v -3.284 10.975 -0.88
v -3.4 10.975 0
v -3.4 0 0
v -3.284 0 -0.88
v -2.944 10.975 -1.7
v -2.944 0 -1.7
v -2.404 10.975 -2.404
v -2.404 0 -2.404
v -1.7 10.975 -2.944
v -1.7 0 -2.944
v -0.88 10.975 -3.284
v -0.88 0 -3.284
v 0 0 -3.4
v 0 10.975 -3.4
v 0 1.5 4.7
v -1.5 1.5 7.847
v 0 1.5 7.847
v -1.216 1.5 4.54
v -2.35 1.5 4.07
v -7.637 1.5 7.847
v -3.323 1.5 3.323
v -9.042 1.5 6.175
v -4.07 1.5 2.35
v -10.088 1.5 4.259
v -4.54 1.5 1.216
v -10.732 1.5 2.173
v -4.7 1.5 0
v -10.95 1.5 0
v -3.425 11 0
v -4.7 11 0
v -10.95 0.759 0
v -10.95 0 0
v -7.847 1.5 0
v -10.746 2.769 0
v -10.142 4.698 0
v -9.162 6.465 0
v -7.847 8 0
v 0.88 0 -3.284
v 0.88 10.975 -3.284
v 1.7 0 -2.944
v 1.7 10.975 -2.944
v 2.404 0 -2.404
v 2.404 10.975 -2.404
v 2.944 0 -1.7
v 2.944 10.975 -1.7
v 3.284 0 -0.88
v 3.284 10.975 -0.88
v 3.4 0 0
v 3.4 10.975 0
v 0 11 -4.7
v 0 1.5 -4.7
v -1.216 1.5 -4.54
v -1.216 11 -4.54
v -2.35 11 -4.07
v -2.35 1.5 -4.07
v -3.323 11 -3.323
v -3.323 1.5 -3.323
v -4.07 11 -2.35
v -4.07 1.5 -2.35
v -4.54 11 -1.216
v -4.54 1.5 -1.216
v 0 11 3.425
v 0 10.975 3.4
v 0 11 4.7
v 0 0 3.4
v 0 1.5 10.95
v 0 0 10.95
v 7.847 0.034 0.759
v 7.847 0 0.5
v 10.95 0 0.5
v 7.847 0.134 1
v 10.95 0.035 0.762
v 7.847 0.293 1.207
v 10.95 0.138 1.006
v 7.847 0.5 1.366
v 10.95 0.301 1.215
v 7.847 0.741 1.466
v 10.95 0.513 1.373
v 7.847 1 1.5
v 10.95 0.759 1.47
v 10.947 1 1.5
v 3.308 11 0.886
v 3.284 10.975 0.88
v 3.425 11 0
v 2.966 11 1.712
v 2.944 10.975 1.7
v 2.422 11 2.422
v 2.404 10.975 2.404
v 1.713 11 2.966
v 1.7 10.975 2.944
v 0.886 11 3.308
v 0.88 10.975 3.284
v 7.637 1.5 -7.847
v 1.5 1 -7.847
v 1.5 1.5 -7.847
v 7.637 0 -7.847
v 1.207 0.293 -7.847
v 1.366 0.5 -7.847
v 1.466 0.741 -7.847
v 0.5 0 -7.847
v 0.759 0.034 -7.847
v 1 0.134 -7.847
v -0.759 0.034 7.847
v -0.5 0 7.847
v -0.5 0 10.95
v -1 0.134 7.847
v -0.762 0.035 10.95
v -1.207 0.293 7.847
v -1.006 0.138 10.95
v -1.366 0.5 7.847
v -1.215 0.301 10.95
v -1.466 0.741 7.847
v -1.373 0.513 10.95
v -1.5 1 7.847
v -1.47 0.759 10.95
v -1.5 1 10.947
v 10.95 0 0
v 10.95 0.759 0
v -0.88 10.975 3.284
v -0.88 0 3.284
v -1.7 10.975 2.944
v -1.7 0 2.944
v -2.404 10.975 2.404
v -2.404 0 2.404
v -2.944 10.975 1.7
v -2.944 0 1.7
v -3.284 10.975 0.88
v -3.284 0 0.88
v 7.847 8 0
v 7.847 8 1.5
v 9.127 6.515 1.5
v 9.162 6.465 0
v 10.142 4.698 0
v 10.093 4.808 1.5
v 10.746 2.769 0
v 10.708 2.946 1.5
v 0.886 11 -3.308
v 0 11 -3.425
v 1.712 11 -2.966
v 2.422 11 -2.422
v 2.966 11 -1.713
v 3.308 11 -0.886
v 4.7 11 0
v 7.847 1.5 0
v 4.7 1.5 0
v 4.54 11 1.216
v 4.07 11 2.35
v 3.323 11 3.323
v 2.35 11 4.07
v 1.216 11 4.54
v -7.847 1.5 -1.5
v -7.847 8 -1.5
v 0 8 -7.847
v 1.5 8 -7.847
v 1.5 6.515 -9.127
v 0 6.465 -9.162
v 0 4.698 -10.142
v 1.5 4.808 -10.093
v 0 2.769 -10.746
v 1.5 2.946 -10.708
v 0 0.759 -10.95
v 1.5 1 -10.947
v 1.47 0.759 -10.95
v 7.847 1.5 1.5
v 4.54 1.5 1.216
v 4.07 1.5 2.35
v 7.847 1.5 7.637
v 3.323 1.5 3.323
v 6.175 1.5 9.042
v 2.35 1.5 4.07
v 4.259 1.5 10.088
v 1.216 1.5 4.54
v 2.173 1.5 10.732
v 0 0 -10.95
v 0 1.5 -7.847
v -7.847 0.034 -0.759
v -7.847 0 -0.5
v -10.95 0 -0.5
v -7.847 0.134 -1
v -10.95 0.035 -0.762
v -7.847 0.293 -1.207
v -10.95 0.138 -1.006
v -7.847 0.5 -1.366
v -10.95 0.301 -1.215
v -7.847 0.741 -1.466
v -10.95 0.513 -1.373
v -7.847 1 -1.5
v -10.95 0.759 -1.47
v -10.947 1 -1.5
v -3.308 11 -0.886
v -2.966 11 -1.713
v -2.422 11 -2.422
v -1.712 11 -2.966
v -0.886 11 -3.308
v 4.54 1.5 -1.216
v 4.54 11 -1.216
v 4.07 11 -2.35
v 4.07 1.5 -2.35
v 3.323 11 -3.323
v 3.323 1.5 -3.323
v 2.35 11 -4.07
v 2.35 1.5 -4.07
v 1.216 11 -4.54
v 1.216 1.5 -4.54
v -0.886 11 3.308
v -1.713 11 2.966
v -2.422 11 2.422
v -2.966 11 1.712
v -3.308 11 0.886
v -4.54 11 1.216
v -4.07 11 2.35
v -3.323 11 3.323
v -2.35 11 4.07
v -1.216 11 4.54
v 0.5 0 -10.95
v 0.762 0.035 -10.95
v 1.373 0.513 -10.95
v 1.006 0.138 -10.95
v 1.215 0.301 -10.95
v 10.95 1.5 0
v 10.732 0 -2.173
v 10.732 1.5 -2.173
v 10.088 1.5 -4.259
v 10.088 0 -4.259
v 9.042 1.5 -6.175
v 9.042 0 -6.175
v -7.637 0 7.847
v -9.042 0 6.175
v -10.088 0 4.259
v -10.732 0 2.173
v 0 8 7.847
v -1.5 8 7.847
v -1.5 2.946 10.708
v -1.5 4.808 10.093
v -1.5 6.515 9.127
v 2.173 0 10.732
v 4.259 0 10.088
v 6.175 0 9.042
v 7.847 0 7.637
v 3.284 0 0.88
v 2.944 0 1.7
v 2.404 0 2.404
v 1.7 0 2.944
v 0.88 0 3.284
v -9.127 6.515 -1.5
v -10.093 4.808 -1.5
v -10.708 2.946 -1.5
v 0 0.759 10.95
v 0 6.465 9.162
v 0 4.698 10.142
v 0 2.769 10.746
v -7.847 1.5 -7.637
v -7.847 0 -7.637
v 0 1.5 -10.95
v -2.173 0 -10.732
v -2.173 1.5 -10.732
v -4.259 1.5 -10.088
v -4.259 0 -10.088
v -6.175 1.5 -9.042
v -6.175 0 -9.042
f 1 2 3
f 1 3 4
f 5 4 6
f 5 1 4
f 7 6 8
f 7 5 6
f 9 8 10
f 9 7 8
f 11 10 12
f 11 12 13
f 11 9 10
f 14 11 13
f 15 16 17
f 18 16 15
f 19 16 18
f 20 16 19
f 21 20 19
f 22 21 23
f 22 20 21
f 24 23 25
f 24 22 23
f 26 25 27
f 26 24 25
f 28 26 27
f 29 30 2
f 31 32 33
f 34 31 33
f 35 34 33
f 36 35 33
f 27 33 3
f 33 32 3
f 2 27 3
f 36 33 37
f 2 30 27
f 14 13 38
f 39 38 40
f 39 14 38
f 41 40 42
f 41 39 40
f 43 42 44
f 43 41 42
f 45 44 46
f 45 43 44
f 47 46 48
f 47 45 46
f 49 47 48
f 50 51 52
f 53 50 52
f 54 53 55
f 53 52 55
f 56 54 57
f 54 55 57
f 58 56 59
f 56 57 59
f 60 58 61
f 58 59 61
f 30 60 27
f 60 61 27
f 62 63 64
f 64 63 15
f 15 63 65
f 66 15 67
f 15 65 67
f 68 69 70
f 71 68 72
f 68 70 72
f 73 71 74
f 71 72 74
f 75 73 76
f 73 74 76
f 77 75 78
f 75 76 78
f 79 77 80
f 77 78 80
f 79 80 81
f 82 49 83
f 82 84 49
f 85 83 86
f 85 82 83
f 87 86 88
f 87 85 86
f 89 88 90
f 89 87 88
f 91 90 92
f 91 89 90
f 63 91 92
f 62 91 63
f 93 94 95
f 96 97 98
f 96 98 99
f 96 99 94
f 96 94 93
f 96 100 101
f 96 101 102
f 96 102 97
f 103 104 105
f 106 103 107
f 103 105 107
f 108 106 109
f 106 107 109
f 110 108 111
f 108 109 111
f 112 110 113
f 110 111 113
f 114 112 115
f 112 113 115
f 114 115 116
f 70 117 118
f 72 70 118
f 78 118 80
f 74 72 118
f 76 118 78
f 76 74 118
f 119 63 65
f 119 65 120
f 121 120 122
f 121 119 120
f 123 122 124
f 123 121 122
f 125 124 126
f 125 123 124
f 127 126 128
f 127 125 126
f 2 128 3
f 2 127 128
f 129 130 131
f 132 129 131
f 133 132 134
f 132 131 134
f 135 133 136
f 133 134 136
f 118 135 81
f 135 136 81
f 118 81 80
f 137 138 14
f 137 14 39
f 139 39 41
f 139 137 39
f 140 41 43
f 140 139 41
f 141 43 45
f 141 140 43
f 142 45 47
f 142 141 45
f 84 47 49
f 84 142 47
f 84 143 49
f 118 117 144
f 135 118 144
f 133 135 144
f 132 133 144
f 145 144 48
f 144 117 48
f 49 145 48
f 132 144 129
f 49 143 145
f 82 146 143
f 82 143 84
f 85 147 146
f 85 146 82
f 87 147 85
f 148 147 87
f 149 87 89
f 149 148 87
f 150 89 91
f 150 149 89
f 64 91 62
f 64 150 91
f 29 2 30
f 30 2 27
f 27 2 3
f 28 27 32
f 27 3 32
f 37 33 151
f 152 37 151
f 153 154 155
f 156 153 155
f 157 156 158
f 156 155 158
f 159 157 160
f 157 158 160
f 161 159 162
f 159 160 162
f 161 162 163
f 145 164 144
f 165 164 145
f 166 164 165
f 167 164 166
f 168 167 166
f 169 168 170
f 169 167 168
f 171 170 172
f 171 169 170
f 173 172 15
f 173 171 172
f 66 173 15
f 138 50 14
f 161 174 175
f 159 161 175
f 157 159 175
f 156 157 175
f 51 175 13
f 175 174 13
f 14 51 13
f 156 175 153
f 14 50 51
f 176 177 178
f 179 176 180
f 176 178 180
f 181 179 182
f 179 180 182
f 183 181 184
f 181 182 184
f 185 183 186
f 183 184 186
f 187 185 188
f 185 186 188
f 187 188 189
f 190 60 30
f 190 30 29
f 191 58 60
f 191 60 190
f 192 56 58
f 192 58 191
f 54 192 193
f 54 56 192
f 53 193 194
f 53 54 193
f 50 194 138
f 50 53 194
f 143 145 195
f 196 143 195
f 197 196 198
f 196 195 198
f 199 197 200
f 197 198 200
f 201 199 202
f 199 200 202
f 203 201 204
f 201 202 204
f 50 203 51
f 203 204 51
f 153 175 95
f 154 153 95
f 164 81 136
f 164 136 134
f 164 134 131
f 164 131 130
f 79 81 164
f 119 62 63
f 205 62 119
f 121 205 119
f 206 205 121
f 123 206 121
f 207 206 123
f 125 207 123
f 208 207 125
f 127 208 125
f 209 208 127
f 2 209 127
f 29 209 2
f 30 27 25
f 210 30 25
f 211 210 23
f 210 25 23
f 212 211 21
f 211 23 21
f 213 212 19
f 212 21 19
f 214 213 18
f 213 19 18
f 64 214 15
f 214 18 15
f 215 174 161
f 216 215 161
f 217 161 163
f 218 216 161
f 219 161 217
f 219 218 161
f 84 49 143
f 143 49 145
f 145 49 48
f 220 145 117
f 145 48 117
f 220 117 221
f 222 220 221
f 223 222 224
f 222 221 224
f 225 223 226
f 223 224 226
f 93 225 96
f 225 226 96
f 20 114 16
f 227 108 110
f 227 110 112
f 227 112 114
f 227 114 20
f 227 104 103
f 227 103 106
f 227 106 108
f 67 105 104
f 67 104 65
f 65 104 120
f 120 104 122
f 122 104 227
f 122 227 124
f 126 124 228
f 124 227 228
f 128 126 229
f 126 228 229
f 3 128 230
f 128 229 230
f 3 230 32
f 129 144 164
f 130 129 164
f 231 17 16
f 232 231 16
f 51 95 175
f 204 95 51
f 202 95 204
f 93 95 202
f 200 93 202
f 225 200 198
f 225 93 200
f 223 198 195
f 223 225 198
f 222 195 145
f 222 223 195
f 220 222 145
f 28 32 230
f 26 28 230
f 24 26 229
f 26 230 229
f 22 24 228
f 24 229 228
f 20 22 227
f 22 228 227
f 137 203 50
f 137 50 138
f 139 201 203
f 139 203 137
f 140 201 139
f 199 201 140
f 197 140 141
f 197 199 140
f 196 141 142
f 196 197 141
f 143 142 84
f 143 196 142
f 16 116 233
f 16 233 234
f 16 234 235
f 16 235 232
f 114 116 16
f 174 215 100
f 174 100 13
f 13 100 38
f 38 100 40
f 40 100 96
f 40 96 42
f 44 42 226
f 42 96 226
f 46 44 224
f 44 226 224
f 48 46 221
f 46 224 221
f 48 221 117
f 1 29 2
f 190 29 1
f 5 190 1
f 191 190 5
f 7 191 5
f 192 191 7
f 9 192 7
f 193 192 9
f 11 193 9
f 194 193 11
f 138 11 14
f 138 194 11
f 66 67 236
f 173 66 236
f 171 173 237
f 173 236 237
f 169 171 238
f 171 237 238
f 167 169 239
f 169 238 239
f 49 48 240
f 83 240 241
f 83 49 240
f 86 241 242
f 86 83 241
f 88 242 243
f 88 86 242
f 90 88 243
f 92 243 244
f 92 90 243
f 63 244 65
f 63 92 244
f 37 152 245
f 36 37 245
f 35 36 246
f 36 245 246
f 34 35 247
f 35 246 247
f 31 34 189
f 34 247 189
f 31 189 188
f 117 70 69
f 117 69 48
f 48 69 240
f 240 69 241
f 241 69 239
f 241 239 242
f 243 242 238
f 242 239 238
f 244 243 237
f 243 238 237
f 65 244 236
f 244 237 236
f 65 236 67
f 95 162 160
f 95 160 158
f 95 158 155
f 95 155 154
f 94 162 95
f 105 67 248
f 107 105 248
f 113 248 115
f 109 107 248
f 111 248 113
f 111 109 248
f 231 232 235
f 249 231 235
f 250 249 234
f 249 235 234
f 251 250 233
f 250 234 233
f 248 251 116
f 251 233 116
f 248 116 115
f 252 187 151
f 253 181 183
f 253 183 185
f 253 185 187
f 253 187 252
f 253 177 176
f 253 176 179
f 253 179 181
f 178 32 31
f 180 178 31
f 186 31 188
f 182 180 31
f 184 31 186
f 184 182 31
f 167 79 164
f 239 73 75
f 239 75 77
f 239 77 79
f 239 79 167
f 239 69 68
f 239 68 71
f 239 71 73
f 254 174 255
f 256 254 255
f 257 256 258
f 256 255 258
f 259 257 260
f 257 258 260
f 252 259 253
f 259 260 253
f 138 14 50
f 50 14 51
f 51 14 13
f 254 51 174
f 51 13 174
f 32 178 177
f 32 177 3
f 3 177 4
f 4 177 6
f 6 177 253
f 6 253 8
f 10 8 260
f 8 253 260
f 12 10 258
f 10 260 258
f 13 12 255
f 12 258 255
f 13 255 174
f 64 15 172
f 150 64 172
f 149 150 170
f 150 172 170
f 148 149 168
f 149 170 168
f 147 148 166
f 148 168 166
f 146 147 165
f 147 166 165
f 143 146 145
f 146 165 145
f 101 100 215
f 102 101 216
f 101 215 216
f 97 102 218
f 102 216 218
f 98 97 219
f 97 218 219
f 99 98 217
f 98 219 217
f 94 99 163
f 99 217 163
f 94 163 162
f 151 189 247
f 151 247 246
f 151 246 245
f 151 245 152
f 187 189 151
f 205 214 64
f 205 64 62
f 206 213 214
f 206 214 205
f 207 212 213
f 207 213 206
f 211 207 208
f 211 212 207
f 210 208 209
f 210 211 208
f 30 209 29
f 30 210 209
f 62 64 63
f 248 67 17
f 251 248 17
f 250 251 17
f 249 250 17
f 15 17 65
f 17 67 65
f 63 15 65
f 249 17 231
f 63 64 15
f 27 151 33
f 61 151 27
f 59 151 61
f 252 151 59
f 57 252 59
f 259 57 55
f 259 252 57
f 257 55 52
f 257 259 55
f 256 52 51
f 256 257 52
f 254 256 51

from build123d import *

# Parameters (mm, degrees)
BOSS_EXTRUDE1_DEPTH = 1.5
SKETCH2_W           = 3
SKETCH2_H           = 8
CUT_EXTRUDE1_DEPTH  = 1.5
SKETCH3_W           = 3.103226286
SKETCH3_H           = 1.5
BOSS_EXTRUDE2_DEPTH = 8
FILLET1_R           = 10
FILLET2_R           = 1
BOSS_EXTRUDE3_DEPTH = 11
CIRPATTERN1_COUNT   = 4


with BuildPart() as part:
    # Sketch1 → Boss-Extrude1 (new body)
    with BuildSketch(Plane(origin=(0, 0, 0), x_dir=(1, 0, 0), z_dir=(0, 1, 0))):
        with BuildLine():
            Line((-10.95, 0), (0, 0))
            Line((0, 0), (0, 10.95))
            ThreePointArc((0, 10.95), (-7.742819254, 7.742819254), (-10.95, 0))
        make_face()
    extrude(amount=BOSS_EXTRUDE1_DEPTH)

    # Sketch2 → Cut-Extrude1 (cut)
    with BuildSketch(Plane(origin=(0, 0, 0), x_dir=(1, 0, 0), z_dir=(0, 1, 0))):
        with Locations((-9.346773714, 5.5)):
            Rectangle(SKETCH2_W, SKETCH2_H)
    extrude(amount=CUT_EXTRUDE1_DEPTH, mode=Mode.SUBTRACT)

    # Sketch3 → Boss-Extrude2 (add)
    with BuildSketch(Plane(origin=(0, 0, 0), x_dir=(1, 0, 0), z_dir=(0, 1, 0))):
        with Locations((-9.398386857, 0.75)):
            Rectangle(SKETCH3_W, SKETCH3_H)
    extrude(amount=BOSS_EXTRUDE2_DEPTH)

    # Fillet1
    # the kernel refuses this fillet: 10 mm, written as the material it takes off along each edge
    with BuildSketch(Plane(origin=(-10.95, 8, -19.602919713), x_dir=(1, 0, 0), z_dir=(0, 0, 1))) as fillet1_piece_1:
        with BuildLine():
            CenterArc((10, -7.241167885), FILLET1_R, 133.604575442, 46.395424558)
            Line((0, -7.241167885), (-0.2, -7.241167885))
            Line((-0.2, -7.241167885), (-0.2, 0))
            Line((-0.2, 0), (0, 0.2))
            ThreePointArc((0, 0.2), (1.551613143, 0.2), (2.965290812, 0.144823358))
            Line((2.965290812, 0.144823358), (3.103226286, 0))
        make_face()
    extrude(amount=37.705839425, mode=Mode.SUBTRACT)

    # Fillet2
    fillet2_edges = [part.edges().sort_by_distance(p)[0] for p in [
        (-9.398386857, 0, -1.5),
    ]]
    fillet(fillet2_edges, radius=FILLET2_R)

    # Sketch4 → Boss-Extrude3 (add)
    with BuildSketch(Plane(origin=(0, 0, 0), x_dir=(1, 0, 0), z_dir=(0, 1, 0))):
        with BuildLine():
            Line((0, 0), (0, 4.7))
            ThreePointArc((0, 4.7), (-3.323401872, 3.323401872), (-4.7, 0))
            Line((-4.7, 0), (0, 0))
        make_face()
    extrude(amount=BOSS_EXTRUDE3_DEPTH)


with BuildPart() as cirpattern1_1:
    # CirPattern1: pattern copy
    add(part.part.rotate(Axis((0, 0, 0), (0, 1, 0)), 1 * 360 / CIRPATTERN1_COUNT))


with BuildPart() as cirpattern1_2:
    # CirPattern1: pattern copy
    add(part.part.rotate(Axis((0, 0, 0), (0, 1, 0)), 2 * 360 / CIRPATTERN1_COUNT))


with BuildPart() as cirpattern1_3:
    # CirPattern1: pattern copy
    add(part.part.rotate(Axis((0, 0, 0), (0, 1, 0)), 3 * 360 / CIRPATTERN1_COUNT))


with BuildPart() as tap_drill_for_m8_tap1_tool:
    # Sketch6 → Tap Drill for M8 Tap1 (revolve)
    with BuildSketch(Plane(origin=(0, 11, 0), x_dir=(0, 0, 1), z_dir=(1, 0, 0))):
        Polygon((0, 0), (0, 11), (3.4, 11), (3.4, 0.025), (3.425, 0), align=None)
    revolve(axis=Axis((0, 17.35, 0), (0, -1, 0)))


with BuildPart() as part_1:
    add(part.part)

    # Tap Drill for M8 Tap1: cut by tap_drill_for_m8_tap1_tool
    add(tap_drill_for_m8_tap1_tool.part, mode=Mode.SUBTRACT)


with BuildPart() as cirpattern1_1_1:
    add(cirpattern1_1.part)

    # Tap Drill for M8 Tap1: cut by tap_drill_for_m8_tap1_tool
    add(tap_drill_for_m8_tap1_tool.part, mode=Mode.SUBTRACT)


with BuildPart() as cirpattern1_2_1:
    add(cirpattern1_2.part)

    # Tap Drill for M8 Tap1: cut by tap_drill_for_m8_tap1_tool
    add(tap_drill_for_m8_tap1_tool.part, mode=Mode.SUBTRACT)


with BuildPart() as cirpattern1_3_1:
    add(cirpattern1_3.part)

    # Tap Drill for M8 Tap1: cut by tap_drill_for_m8_tap1_tool
    add(tap_drill_for_m8_tap1_tool.part, mode=Mode.SUBTRACT)


solid = Compound([part_1.part, cirpattern1_1_1.part, cirpattern1_2_1.part, cirpattern1_3_1.part])
